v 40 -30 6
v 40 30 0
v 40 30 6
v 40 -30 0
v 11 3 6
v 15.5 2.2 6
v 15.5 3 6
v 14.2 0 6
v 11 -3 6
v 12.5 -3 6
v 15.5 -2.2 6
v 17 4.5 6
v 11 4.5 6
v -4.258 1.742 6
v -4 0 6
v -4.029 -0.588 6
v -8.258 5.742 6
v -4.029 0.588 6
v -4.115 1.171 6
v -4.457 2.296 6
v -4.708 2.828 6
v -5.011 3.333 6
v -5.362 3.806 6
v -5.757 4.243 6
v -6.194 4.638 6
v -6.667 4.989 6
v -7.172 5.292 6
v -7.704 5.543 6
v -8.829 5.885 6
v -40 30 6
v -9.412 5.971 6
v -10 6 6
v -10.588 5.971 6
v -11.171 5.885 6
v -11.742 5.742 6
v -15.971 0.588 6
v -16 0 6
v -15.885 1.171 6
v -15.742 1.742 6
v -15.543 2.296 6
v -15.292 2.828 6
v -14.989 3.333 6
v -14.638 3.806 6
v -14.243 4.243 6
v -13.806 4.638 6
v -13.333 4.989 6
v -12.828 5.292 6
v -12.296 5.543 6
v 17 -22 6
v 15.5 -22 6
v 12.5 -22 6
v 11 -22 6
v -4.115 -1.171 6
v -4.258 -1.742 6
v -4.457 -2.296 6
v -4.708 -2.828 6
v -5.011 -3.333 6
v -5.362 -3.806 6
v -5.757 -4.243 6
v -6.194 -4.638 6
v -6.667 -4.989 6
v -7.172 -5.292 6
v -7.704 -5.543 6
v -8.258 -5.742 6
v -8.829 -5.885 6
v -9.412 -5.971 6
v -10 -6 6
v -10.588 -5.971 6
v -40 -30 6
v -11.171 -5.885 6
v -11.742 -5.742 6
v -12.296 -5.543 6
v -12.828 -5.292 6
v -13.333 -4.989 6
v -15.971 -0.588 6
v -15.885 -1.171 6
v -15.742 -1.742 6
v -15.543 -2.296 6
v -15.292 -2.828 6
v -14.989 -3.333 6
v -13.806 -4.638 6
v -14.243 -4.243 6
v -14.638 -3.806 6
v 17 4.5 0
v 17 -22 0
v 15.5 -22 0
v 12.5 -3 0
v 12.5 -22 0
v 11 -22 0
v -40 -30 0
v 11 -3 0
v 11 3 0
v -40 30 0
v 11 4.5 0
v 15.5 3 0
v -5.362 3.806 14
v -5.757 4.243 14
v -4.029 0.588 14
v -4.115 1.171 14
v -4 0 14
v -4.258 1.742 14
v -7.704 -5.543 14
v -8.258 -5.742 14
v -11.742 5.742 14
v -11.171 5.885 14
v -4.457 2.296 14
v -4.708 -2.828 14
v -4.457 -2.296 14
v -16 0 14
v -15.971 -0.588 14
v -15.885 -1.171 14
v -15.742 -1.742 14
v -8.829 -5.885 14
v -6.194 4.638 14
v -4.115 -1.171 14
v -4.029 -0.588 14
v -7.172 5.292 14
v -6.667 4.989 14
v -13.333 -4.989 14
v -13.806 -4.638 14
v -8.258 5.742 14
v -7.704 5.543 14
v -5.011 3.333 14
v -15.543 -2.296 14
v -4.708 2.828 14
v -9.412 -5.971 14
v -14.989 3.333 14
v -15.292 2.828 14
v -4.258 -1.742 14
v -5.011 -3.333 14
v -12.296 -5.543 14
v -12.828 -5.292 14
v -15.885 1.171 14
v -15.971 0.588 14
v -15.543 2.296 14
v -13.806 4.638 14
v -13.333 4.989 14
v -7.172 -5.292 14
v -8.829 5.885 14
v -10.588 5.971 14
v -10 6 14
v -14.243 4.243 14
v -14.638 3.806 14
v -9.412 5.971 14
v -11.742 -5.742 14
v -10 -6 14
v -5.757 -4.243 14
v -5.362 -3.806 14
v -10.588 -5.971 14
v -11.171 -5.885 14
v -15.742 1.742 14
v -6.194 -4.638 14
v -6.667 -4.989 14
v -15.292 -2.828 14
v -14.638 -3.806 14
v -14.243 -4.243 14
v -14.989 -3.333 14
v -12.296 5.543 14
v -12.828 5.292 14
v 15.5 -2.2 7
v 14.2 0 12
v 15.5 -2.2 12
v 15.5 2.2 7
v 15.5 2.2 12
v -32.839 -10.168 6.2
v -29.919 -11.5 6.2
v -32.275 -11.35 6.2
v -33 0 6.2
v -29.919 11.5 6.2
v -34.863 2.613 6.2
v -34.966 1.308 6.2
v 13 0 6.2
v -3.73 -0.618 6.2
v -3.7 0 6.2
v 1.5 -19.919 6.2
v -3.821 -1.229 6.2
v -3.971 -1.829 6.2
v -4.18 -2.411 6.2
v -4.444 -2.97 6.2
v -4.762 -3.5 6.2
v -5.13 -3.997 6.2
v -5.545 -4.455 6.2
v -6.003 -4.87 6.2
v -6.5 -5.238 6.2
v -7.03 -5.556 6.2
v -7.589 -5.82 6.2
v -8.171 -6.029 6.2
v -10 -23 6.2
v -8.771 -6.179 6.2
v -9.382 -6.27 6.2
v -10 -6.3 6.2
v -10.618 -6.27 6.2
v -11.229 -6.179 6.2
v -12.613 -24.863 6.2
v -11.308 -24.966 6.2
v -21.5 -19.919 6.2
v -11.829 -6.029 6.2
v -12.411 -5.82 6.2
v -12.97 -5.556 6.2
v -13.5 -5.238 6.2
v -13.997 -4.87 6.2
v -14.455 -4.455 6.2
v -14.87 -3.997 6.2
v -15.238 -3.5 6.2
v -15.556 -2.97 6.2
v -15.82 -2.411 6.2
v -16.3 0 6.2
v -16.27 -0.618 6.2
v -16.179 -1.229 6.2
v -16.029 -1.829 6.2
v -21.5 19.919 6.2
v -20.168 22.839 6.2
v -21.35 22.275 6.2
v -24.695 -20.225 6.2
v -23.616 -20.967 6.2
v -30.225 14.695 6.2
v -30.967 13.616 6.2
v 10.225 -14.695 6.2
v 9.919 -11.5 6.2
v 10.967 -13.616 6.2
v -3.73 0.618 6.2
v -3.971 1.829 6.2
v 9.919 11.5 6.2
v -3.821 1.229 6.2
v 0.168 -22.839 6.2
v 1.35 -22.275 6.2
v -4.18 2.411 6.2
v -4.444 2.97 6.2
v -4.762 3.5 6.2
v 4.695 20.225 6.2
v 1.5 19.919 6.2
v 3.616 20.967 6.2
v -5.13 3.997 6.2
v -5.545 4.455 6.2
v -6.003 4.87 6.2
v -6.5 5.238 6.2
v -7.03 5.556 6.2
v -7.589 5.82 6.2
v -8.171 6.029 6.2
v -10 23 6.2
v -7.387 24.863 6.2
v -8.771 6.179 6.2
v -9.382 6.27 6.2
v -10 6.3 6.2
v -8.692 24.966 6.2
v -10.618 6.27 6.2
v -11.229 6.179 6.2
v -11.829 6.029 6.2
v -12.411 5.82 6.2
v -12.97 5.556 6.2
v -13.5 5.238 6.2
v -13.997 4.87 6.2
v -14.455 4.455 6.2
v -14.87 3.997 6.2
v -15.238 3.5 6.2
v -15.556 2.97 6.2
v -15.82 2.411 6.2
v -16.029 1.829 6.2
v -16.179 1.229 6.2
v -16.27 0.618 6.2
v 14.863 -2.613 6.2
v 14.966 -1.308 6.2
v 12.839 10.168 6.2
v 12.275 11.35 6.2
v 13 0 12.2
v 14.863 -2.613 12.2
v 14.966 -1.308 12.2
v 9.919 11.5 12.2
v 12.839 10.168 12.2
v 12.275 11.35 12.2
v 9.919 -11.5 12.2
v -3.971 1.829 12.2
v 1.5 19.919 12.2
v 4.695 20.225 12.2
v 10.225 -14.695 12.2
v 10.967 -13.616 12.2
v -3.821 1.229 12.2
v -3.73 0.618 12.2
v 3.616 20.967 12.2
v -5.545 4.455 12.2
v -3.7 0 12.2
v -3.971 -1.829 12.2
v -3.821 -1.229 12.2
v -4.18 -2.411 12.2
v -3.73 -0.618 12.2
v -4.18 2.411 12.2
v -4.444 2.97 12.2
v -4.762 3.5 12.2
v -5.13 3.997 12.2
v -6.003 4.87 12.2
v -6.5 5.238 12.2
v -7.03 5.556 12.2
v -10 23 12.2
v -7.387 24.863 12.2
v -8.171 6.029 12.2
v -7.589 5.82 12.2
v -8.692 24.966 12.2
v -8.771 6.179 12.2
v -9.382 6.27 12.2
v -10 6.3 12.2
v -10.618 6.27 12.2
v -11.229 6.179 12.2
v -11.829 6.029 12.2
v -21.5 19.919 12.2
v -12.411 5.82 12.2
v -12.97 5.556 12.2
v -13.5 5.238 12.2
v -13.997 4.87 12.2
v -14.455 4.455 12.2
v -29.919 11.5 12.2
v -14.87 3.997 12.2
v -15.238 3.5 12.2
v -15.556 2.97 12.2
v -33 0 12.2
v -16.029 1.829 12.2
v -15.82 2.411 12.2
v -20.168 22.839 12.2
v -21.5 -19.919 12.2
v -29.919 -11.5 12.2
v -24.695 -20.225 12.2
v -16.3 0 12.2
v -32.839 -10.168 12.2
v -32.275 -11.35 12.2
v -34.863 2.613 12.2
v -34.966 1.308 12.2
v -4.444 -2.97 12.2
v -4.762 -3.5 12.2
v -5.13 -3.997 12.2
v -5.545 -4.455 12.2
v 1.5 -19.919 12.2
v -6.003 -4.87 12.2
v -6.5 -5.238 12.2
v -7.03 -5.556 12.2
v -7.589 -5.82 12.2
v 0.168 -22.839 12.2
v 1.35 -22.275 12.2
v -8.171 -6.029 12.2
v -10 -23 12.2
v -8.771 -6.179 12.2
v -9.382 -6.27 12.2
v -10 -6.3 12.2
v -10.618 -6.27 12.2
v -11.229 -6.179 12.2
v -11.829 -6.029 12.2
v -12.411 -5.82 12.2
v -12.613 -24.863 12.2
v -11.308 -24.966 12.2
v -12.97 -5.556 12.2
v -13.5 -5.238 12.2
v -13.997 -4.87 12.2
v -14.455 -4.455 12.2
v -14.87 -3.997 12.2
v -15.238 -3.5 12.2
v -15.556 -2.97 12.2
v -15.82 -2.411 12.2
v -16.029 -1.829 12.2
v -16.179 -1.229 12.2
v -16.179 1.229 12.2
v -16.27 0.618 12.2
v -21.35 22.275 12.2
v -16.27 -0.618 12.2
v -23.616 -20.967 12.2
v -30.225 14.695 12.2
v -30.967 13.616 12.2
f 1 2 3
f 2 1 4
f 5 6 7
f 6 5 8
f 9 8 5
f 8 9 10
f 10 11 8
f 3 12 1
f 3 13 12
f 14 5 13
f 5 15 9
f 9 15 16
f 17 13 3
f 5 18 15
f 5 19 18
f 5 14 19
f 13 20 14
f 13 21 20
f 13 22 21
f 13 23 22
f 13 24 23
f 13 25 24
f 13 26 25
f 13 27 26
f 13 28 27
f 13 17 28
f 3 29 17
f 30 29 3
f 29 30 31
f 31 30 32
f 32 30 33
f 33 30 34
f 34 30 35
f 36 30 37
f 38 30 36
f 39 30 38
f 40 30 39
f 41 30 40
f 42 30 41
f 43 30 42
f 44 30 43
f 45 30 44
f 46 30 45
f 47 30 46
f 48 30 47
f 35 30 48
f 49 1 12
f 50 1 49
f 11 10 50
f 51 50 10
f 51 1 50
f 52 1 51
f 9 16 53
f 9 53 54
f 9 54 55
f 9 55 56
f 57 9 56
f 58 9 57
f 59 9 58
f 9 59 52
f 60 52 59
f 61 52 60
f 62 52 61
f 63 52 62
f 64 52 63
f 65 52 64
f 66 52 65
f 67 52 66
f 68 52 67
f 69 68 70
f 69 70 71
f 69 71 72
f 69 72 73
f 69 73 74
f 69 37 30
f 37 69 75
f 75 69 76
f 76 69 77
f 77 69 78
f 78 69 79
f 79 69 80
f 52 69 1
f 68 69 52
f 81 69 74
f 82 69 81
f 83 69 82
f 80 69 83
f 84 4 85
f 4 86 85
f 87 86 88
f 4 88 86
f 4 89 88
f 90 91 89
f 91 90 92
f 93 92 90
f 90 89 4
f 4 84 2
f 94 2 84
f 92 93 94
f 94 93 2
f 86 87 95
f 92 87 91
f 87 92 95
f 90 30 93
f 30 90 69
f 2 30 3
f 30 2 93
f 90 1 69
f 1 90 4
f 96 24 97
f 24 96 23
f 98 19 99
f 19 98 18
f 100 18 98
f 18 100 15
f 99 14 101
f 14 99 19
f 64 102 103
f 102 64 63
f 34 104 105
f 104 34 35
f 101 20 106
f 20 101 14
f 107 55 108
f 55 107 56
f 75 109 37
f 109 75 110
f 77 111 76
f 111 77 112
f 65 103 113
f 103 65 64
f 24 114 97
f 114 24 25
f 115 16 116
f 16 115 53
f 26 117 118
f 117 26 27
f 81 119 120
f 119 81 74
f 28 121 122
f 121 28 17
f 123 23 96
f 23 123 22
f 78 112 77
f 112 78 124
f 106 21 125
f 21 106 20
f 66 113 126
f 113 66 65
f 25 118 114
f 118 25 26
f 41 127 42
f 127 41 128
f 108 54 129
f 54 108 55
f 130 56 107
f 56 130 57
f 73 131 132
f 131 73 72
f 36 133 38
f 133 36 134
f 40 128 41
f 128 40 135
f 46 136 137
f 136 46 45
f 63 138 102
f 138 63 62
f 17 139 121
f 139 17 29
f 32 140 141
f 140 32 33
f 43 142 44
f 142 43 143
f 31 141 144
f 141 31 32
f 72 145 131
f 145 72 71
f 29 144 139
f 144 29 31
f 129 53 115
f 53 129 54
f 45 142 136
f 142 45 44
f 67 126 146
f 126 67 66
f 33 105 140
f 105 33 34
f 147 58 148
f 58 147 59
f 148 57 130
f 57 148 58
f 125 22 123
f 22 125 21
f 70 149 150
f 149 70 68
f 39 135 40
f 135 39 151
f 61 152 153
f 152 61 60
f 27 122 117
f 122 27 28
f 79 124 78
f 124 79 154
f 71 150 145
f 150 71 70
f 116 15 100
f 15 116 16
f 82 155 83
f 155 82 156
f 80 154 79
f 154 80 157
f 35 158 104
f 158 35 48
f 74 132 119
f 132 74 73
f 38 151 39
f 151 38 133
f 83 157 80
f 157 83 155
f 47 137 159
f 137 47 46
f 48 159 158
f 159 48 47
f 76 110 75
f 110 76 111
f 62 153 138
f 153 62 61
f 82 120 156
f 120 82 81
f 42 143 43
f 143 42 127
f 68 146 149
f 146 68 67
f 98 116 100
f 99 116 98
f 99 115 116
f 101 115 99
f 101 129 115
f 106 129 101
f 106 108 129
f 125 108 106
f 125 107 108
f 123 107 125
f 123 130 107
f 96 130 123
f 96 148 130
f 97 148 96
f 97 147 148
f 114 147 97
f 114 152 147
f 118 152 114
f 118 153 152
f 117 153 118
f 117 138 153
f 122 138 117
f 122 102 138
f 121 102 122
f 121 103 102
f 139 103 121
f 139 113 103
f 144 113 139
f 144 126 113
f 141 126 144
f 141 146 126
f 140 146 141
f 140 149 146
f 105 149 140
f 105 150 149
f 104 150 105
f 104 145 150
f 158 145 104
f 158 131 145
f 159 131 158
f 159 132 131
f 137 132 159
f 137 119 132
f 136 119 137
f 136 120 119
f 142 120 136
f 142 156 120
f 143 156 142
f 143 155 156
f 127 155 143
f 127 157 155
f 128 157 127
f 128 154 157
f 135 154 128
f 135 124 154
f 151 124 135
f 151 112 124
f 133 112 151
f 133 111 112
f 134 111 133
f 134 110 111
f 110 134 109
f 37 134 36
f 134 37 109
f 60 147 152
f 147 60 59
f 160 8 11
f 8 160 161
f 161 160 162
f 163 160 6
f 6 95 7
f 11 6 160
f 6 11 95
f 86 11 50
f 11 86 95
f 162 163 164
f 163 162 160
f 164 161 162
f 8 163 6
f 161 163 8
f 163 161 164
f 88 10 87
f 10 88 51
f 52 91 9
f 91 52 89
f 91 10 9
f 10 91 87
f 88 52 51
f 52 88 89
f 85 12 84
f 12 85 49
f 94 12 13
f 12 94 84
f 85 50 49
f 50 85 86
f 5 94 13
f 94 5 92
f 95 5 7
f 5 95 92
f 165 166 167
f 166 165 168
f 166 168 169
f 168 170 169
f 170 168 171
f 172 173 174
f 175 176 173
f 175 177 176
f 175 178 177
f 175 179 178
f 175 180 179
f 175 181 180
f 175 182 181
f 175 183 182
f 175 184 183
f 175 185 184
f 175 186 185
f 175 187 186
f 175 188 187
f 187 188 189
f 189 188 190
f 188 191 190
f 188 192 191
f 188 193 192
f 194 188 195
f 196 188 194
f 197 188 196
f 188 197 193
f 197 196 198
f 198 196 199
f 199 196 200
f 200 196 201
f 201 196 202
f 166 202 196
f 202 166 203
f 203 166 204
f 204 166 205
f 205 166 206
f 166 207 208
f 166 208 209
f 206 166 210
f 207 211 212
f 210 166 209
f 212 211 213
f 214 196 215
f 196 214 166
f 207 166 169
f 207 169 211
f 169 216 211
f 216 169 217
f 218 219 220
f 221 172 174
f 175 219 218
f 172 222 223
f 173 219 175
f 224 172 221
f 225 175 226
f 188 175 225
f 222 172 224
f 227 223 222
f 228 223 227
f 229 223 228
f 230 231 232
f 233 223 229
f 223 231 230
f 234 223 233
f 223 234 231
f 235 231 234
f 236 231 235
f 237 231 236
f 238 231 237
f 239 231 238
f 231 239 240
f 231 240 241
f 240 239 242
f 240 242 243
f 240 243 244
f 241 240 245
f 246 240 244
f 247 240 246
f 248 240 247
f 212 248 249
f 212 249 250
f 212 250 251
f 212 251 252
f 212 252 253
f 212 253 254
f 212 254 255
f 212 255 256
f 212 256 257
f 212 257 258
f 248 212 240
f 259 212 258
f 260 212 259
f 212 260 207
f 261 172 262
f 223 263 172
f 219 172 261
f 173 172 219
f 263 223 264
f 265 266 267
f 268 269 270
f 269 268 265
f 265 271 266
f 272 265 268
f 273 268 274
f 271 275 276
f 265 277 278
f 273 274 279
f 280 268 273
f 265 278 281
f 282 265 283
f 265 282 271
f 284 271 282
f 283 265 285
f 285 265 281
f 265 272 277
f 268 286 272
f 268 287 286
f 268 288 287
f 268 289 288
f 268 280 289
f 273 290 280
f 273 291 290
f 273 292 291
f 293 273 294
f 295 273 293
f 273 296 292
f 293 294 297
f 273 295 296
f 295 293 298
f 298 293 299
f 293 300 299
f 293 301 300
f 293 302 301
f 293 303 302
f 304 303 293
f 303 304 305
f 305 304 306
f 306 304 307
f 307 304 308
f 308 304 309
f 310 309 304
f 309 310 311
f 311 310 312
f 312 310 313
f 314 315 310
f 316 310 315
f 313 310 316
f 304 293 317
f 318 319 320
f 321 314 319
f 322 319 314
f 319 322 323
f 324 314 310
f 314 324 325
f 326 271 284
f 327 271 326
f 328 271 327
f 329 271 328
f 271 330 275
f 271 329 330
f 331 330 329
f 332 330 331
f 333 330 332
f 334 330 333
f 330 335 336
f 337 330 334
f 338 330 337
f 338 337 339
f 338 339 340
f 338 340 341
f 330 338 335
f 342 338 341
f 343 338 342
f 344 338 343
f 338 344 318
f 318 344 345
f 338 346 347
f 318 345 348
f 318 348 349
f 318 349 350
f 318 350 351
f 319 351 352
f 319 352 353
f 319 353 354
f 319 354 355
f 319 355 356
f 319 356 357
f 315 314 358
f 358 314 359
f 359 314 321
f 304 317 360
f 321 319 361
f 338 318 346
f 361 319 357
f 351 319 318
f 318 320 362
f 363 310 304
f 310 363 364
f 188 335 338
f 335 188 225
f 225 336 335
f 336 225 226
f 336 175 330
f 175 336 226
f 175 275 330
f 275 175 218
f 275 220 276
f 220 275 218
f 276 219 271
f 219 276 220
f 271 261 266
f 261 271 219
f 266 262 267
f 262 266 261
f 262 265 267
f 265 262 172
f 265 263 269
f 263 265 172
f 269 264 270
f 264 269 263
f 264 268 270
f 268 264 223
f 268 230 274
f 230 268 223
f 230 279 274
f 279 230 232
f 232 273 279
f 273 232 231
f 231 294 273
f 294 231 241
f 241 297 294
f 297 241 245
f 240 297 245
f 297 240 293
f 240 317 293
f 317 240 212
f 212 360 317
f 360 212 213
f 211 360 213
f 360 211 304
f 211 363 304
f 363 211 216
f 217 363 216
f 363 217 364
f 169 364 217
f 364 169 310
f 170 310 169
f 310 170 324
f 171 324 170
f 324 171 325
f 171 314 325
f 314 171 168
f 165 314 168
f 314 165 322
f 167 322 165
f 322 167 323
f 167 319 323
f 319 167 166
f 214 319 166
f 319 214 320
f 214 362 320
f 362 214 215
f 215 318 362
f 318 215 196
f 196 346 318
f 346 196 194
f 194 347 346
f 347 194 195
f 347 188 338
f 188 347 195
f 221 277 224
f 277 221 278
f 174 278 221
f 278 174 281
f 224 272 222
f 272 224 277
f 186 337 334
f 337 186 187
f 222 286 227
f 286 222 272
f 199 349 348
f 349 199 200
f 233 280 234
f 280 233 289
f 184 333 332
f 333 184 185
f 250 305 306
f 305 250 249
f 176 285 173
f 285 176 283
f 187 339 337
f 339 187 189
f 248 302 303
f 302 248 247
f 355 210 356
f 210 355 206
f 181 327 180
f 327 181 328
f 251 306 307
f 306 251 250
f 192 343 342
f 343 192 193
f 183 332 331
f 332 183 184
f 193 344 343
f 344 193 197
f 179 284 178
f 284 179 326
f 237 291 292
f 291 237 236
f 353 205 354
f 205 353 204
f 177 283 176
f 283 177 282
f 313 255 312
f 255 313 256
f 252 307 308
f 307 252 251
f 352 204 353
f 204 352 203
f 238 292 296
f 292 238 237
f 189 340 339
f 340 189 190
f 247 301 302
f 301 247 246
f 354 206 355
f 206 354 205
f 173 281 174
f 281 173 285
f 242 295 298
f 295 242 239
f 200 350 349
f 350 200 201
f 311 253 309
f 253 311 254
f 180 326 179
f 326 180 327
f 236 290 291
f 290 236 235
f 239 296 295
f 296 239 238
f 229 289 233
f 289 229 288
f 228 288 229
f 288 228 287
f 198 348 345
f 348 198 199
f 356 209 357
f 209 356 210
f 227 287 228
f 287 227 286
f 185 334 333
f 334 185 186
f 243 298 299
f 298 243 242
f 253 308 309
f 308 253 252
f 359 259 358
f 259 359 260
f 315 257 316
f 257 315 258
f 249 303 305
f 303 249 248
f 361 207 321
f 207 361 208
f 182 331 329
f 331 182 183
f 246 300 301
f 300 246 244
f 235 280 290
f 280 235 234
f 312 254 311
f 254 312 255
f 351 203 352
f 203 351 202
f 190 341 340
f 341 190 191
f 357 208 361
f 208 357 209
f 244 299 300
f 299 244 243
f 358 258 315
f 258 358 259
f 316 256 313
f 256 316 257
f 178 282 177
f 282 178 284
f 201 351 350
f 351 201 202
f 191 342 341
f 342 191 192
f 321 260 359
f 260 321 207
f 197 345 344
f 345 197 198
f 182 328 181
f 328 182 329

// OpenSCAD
/* Ratchet wheel with spring pawl - desk demo, PLA, 0.4 mm nozzle, no supports.
   Wheel (~50 mm, 12 teeth) turns on a post; the pawl is part of the base on a
   flexible arm cut from the plate (U-slot). Free way is clockwise seen from
   above (negative rotation about +Z): the shallow tooth flanks cam the pawl
   out, the steep flanks block it in reverse. Zero overhangs: the pawl stands
   fully on the arm, all walls vertical. */
part = "assembly"; // [wheel:Wheel, base:Base, assembly:Assembly]

cadverify_only = "";
module instance(name, part, unit = 1) {
    echo(cadverify_instance = [name, part, unit]);
    if (cadverify_only == "" || cadverify_only == name) children();
}

// ---------- parameters (mm) ----------
Rtip = 25;          // wheel outer radius (50 mm across)
Rroot = 23;         // wheel root radius (tooth height 2 mm)
wheel_t = 6;        // wheel thickness
hole_D = 12.6;      // wheel centre hole diameter
post_D = 12;        // base post diameter (0.6 mm play on diameter)
post_h = 8;         // post height above base top
base_t = 6;         // base plate thickness
base_x = 80;
base_y = 60;
wheel_cx = -10;     // wheel centre in base/assembly XY
wheel_cy = 0;
wheel_gap = 0.2;    // wheel bottom above base top
wheel_lift_z = base_t + wheel_gap;   // 6.2 wheel bottom in assembly
post_top_z = base_t + post_h;        // 14
pawl_tip_x = 14.2;  // pawl tip: 0.8 inside tip circle, 1.2 off root
beam_x0 = 12.5; beam_x1 = 15.5;      // flexible arm: 3 mm wide ...
beam_y0 = -22; beam_y1 = 3;          // ... 25 mm long, fixed south, free north
slot_w = 1.5;       // slot width (clears a 0.4 mm nozzle)
pawl_h = 6;         // pawl height above plate (meets wheel band 6.2..12.2)
rest_angle = 0;     // gullet bottom centred on pawl tip

// tooth k: root at 30k, shallow rise to tip at 30k+24, tip land to +27,
// steep drop to root at +30.
function wheel_pts() = [
    for(k=[0:11]) for(j=[0:2])
        j==0 ? [Rroot*cos(k*30), Rroot*sin(k*30)]
      : j==1 ? [Rtip*cos(k*30+24), Rtip*sin(k*30+24)]
             : [Rtip*cos(k*30+27), Rtip*sin(k*30+27)]
];

module wheel() {
    difference() {
        linear_extrude(height=wheel_t, convexity=4)
            polygon(points=wheel_pts());
        translate([0,0,-1]) cylinder(d=hole_D, h=wheel_t+2, $fn=64);
    }
}

module base() {
    difference() {
        union() {
            // plate
            translate([-base_x/2, -base_y/2, 0]) cube([base_x, base_y, base_t]);
            // post the wheel turns on
            translate([wheel_cx, wheel_cy, base_t]) cylinder(d=post_D, h=post_h, $fn=64);
            // pawl wedge: tip near the wheel, root fused onto the free end of the
            // arm; the whole underside stands on the arm (no bridge)
            translate([0,0,base_t]) linear_extrude(height=pawl_h, convexity=2)
                polygon(points=[[pawl_tip_x, 0],[beam_x1, 2.2],[beam_x1, -2.2]]);
        }
        // U-slot freeing the arm: one connected through opening, all walls vertical
        translate([beam_x0-slot_w, beam_y0, -1]) cube([slot_w, 19, base_t+2]); // west x11..12.5 y-22..-3
        translate([beam_x1, beam_y0, -1]) cube([slot_w, 26.5, base_t+2]);      // east x15.5..17 y-22..4.5
        translate([beam_x0-slot_w, beam_y1, -1]) cube([6, slot_w, base_t+2]);  // north x11..17 y3..4.5
    }
}

module assembly() {
    instance("base_inst", "base", 1) base();
    instance("wheel_inst", "wheel", 1)
        translate([wheel_cx, wheel_cy, wheel_lift_z]) rotate([0,0,rest_angle]) wheel();
}

// ---------- specs (computed from parameters) ----------
wheel_spec = [
    ["bounds", [[-Rtip, -Rtip, 0], [Rtip, Rtip, wheel_t]]],
    ["bodies", 1],
    ["through_holes", 1],
    ["support_faces", [["bed", "-z", 800]]],
    ["overhangs_allowed", []],
    ["copies", 1],
    ["details", [
        ["axle_hole", "hole", [0, 0, wheel_t+4], [0, 0, -1], [[0, hole_D], [3, hole_D]]],
        ["rim_thick", "thickness", [15, 0, wheel_t+4], [0, 0, -1], wheel_t],
        ["tooth0", "material", [[22.05, 7.71, 0], [23.05, 8.71, wheel_t]], 0.5],
        ["tooth4", "material", [[-18.89, 14.93, 0], [-17.89, 15.93, wheel_t]], 0.5],
        ["tooth8", "material", [[-4.67, -24.14, 0], [-3.67, -23.14, wheel_t]], 0.5]
    ]]
];

base_spec = [
    ["bounds", [[-base_x/2, -base_y/2, 0], [base_x/2, base_y/2, post_top_z]]],
    ["bodies", 1],
    ["through_holes", 1],
    ["support_faces", [["bed", "-z", 2000]]],
    ["overhangs_allowed", []],
    ["copies", 1],
    ["details", [
        ["plate_thick", "thickness", [0, -28, base_t+4], [0, 0, -1], base_t],
        ["post_dia", "thickness", [wheel_cx-10, wheel_cy, base_t+post_h-1], [1, 0, 0], post_D],
        ["post_core", "material", [[wheel_cx-2, -2, 8], [wheel_cx+2, 2, 13]], 0.8],
        ["arm_width", "thickness", [beam_x0-0.75, -16, 3], [1, 0, 0], beam_x1-beam_x0],
        ["arm_full", "material", [[13, -20, 0], [15, -12, base_t]], 0.8],
        ["slot_gap", "void", [[beam_x0-slot_w, -20, 0], [beam_x0, -10, base_t]], 0.8],
        ["slot_east", "void", [[beam_x1, -20, 0], [beam_x1+slot_w, -10, base_t]], 0.8],
        ["pawl_tip", "material", [[14.4, -0.3, 8], [15.2, 0.3, 11]], 0.5],
        ["pawl_stack", "thickness", [14.8, 0, base_t+pawl_h+3], [0, 0, -1], base_t+pawl_h]
    ]]
];

assembly_spec = [
    ["bounds", [[-base_x/2, -base_y/2, 0], [base_x/2, base_y/2, post_top_z]]],
    ["support_faces", [["desk", "-z", 2000]]],
    ["allowed_interferences", []],
    ["motions", [
        ["spin_free", ["wheel_inst"], "rotate", [wheel_cx, wheel_cy, wheel_lift_z], [0, 0, 1], [0, -360],
            ["flex", [["wheel_inst", "base_inst", 0.9, "pawl clicks over teeth"]]]]
    ]],
    ["assembly_order", [
        [["base_inst"], [0, 0, 0]],
        [["wheel_inst"], [0, 0, -1]]
    ]]
];

if (part == "wheel") {
    echo(cadverify_spec = wheel_spec);
    wheel();
} else if (part == "base") {
    echo(cadverify_spec = base_spec);
    base();
} else {
    echo(cadverify_spec = assembly_spec);
    assembly();
}
